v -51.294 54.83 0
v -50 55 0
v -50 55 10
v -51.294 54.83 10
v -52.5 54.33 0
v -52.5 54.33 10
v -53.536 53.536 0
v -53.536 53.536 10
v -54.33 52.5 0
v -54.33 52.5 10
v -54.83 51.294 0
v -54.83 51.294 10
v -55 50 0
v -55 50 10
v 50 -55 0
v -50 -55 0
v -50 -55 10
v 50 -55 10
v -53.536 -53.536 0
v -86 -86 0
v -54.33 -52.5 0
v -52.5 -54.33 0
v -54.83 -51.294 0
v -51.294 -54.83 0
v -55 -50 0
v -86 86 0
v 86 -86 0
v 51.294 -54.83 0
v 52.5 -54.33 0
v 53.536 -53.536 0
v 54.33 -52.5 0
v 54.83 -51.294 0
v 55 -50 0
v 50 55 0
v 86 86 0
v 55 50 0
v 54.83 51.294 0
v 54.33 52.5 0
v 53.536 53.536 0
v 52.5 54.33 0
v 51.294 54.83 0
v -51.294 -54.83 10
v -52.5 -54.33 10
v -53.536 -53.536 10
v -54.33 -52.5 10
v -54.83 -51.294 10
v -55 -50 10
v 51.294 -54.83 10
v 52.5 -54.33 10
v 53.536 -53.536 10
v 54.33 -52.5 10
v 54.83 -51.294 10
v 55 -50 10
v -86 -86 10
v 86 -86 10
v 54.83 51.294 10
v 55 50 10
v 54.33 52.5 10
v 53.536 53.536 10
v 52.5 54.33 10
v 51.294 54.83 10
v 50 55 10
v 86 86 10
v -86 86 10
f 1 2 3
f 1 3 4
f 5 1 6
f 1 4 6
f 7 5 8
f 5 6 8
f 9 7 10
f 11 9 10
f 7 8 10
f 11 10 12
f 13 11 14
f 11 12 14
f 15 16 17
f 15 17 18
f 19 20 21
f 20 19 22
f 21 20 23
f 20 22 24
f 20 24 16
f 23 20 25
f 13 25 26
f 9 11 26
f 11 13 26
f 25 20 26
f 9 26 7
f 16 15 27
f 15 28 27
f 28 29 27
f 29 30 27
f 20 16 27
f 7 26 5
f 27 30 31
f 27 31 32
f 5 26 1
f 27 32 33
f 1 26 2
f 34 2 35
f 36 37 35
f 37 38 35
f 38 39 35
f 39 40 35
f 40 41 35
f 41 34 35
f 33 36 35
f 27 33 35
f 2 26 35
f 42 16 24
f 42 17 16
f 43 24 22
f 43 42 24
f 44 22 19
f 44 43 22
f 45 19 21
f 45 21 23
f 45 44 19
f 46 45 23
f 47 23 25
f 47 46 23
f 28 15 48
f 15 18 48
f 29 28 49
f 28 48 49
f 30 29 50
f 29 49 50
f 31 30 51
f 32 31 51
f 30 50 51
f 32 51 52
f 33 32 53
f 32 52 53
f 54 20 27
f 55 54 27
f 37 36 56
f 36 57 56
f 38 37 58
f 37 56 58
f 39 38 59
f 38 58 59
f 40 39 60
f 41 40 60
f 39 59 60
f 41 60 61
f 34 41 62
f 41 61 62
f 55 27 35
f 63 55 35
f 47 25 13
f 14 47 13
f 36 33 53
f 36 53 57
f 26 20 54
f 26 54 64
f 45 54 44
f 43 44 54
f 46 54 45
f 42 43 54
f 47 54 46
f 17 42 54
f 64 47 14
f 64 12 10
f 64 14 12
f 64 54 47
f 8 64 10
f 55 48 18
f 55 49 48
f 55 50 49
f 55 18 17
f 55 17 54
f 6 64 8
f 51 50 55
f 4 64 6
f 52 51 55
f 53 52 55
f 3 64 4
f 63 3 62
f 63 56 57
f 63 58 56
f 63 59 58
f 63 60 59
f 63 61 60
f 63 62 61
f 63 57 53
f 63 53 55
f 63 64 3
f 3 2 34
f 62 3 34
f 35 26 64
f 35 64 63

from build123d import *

# Parameters (mm, degrees)
F0_W     = 172
F0_H     = 172
F1_DEPTH = 10
F2_W     = 110
F2_H     = 110
F3_DEPTH = 45
F4_R     = 5


with BuildPart() as f1:
    # F0 (on Top) → F1 (new body)
    with BuildSketch(Plane.XY):
        Rectangle(F0_W, F0_H)
    extrude(amount=F1_DEPTH)

    # F2 (on Top) → F3 (cut)
    with BuildSketch(Plane.XY):
        Rectangle(F2_W, F2_H)
    extrude(amount=F3_DEPTH, mode=Mode.SUBTRACT)

    # F4
    f4_edges = [f1.edges().sort_by_distance(p)[0] for p in [
        (55, 55, 5),
        (55, -55, 5),
        (-55, -55, 5),
        (-55, 55, 5),
    ]]
    fillet(f4_edges, radius=F4_R)


solid = f1.part
